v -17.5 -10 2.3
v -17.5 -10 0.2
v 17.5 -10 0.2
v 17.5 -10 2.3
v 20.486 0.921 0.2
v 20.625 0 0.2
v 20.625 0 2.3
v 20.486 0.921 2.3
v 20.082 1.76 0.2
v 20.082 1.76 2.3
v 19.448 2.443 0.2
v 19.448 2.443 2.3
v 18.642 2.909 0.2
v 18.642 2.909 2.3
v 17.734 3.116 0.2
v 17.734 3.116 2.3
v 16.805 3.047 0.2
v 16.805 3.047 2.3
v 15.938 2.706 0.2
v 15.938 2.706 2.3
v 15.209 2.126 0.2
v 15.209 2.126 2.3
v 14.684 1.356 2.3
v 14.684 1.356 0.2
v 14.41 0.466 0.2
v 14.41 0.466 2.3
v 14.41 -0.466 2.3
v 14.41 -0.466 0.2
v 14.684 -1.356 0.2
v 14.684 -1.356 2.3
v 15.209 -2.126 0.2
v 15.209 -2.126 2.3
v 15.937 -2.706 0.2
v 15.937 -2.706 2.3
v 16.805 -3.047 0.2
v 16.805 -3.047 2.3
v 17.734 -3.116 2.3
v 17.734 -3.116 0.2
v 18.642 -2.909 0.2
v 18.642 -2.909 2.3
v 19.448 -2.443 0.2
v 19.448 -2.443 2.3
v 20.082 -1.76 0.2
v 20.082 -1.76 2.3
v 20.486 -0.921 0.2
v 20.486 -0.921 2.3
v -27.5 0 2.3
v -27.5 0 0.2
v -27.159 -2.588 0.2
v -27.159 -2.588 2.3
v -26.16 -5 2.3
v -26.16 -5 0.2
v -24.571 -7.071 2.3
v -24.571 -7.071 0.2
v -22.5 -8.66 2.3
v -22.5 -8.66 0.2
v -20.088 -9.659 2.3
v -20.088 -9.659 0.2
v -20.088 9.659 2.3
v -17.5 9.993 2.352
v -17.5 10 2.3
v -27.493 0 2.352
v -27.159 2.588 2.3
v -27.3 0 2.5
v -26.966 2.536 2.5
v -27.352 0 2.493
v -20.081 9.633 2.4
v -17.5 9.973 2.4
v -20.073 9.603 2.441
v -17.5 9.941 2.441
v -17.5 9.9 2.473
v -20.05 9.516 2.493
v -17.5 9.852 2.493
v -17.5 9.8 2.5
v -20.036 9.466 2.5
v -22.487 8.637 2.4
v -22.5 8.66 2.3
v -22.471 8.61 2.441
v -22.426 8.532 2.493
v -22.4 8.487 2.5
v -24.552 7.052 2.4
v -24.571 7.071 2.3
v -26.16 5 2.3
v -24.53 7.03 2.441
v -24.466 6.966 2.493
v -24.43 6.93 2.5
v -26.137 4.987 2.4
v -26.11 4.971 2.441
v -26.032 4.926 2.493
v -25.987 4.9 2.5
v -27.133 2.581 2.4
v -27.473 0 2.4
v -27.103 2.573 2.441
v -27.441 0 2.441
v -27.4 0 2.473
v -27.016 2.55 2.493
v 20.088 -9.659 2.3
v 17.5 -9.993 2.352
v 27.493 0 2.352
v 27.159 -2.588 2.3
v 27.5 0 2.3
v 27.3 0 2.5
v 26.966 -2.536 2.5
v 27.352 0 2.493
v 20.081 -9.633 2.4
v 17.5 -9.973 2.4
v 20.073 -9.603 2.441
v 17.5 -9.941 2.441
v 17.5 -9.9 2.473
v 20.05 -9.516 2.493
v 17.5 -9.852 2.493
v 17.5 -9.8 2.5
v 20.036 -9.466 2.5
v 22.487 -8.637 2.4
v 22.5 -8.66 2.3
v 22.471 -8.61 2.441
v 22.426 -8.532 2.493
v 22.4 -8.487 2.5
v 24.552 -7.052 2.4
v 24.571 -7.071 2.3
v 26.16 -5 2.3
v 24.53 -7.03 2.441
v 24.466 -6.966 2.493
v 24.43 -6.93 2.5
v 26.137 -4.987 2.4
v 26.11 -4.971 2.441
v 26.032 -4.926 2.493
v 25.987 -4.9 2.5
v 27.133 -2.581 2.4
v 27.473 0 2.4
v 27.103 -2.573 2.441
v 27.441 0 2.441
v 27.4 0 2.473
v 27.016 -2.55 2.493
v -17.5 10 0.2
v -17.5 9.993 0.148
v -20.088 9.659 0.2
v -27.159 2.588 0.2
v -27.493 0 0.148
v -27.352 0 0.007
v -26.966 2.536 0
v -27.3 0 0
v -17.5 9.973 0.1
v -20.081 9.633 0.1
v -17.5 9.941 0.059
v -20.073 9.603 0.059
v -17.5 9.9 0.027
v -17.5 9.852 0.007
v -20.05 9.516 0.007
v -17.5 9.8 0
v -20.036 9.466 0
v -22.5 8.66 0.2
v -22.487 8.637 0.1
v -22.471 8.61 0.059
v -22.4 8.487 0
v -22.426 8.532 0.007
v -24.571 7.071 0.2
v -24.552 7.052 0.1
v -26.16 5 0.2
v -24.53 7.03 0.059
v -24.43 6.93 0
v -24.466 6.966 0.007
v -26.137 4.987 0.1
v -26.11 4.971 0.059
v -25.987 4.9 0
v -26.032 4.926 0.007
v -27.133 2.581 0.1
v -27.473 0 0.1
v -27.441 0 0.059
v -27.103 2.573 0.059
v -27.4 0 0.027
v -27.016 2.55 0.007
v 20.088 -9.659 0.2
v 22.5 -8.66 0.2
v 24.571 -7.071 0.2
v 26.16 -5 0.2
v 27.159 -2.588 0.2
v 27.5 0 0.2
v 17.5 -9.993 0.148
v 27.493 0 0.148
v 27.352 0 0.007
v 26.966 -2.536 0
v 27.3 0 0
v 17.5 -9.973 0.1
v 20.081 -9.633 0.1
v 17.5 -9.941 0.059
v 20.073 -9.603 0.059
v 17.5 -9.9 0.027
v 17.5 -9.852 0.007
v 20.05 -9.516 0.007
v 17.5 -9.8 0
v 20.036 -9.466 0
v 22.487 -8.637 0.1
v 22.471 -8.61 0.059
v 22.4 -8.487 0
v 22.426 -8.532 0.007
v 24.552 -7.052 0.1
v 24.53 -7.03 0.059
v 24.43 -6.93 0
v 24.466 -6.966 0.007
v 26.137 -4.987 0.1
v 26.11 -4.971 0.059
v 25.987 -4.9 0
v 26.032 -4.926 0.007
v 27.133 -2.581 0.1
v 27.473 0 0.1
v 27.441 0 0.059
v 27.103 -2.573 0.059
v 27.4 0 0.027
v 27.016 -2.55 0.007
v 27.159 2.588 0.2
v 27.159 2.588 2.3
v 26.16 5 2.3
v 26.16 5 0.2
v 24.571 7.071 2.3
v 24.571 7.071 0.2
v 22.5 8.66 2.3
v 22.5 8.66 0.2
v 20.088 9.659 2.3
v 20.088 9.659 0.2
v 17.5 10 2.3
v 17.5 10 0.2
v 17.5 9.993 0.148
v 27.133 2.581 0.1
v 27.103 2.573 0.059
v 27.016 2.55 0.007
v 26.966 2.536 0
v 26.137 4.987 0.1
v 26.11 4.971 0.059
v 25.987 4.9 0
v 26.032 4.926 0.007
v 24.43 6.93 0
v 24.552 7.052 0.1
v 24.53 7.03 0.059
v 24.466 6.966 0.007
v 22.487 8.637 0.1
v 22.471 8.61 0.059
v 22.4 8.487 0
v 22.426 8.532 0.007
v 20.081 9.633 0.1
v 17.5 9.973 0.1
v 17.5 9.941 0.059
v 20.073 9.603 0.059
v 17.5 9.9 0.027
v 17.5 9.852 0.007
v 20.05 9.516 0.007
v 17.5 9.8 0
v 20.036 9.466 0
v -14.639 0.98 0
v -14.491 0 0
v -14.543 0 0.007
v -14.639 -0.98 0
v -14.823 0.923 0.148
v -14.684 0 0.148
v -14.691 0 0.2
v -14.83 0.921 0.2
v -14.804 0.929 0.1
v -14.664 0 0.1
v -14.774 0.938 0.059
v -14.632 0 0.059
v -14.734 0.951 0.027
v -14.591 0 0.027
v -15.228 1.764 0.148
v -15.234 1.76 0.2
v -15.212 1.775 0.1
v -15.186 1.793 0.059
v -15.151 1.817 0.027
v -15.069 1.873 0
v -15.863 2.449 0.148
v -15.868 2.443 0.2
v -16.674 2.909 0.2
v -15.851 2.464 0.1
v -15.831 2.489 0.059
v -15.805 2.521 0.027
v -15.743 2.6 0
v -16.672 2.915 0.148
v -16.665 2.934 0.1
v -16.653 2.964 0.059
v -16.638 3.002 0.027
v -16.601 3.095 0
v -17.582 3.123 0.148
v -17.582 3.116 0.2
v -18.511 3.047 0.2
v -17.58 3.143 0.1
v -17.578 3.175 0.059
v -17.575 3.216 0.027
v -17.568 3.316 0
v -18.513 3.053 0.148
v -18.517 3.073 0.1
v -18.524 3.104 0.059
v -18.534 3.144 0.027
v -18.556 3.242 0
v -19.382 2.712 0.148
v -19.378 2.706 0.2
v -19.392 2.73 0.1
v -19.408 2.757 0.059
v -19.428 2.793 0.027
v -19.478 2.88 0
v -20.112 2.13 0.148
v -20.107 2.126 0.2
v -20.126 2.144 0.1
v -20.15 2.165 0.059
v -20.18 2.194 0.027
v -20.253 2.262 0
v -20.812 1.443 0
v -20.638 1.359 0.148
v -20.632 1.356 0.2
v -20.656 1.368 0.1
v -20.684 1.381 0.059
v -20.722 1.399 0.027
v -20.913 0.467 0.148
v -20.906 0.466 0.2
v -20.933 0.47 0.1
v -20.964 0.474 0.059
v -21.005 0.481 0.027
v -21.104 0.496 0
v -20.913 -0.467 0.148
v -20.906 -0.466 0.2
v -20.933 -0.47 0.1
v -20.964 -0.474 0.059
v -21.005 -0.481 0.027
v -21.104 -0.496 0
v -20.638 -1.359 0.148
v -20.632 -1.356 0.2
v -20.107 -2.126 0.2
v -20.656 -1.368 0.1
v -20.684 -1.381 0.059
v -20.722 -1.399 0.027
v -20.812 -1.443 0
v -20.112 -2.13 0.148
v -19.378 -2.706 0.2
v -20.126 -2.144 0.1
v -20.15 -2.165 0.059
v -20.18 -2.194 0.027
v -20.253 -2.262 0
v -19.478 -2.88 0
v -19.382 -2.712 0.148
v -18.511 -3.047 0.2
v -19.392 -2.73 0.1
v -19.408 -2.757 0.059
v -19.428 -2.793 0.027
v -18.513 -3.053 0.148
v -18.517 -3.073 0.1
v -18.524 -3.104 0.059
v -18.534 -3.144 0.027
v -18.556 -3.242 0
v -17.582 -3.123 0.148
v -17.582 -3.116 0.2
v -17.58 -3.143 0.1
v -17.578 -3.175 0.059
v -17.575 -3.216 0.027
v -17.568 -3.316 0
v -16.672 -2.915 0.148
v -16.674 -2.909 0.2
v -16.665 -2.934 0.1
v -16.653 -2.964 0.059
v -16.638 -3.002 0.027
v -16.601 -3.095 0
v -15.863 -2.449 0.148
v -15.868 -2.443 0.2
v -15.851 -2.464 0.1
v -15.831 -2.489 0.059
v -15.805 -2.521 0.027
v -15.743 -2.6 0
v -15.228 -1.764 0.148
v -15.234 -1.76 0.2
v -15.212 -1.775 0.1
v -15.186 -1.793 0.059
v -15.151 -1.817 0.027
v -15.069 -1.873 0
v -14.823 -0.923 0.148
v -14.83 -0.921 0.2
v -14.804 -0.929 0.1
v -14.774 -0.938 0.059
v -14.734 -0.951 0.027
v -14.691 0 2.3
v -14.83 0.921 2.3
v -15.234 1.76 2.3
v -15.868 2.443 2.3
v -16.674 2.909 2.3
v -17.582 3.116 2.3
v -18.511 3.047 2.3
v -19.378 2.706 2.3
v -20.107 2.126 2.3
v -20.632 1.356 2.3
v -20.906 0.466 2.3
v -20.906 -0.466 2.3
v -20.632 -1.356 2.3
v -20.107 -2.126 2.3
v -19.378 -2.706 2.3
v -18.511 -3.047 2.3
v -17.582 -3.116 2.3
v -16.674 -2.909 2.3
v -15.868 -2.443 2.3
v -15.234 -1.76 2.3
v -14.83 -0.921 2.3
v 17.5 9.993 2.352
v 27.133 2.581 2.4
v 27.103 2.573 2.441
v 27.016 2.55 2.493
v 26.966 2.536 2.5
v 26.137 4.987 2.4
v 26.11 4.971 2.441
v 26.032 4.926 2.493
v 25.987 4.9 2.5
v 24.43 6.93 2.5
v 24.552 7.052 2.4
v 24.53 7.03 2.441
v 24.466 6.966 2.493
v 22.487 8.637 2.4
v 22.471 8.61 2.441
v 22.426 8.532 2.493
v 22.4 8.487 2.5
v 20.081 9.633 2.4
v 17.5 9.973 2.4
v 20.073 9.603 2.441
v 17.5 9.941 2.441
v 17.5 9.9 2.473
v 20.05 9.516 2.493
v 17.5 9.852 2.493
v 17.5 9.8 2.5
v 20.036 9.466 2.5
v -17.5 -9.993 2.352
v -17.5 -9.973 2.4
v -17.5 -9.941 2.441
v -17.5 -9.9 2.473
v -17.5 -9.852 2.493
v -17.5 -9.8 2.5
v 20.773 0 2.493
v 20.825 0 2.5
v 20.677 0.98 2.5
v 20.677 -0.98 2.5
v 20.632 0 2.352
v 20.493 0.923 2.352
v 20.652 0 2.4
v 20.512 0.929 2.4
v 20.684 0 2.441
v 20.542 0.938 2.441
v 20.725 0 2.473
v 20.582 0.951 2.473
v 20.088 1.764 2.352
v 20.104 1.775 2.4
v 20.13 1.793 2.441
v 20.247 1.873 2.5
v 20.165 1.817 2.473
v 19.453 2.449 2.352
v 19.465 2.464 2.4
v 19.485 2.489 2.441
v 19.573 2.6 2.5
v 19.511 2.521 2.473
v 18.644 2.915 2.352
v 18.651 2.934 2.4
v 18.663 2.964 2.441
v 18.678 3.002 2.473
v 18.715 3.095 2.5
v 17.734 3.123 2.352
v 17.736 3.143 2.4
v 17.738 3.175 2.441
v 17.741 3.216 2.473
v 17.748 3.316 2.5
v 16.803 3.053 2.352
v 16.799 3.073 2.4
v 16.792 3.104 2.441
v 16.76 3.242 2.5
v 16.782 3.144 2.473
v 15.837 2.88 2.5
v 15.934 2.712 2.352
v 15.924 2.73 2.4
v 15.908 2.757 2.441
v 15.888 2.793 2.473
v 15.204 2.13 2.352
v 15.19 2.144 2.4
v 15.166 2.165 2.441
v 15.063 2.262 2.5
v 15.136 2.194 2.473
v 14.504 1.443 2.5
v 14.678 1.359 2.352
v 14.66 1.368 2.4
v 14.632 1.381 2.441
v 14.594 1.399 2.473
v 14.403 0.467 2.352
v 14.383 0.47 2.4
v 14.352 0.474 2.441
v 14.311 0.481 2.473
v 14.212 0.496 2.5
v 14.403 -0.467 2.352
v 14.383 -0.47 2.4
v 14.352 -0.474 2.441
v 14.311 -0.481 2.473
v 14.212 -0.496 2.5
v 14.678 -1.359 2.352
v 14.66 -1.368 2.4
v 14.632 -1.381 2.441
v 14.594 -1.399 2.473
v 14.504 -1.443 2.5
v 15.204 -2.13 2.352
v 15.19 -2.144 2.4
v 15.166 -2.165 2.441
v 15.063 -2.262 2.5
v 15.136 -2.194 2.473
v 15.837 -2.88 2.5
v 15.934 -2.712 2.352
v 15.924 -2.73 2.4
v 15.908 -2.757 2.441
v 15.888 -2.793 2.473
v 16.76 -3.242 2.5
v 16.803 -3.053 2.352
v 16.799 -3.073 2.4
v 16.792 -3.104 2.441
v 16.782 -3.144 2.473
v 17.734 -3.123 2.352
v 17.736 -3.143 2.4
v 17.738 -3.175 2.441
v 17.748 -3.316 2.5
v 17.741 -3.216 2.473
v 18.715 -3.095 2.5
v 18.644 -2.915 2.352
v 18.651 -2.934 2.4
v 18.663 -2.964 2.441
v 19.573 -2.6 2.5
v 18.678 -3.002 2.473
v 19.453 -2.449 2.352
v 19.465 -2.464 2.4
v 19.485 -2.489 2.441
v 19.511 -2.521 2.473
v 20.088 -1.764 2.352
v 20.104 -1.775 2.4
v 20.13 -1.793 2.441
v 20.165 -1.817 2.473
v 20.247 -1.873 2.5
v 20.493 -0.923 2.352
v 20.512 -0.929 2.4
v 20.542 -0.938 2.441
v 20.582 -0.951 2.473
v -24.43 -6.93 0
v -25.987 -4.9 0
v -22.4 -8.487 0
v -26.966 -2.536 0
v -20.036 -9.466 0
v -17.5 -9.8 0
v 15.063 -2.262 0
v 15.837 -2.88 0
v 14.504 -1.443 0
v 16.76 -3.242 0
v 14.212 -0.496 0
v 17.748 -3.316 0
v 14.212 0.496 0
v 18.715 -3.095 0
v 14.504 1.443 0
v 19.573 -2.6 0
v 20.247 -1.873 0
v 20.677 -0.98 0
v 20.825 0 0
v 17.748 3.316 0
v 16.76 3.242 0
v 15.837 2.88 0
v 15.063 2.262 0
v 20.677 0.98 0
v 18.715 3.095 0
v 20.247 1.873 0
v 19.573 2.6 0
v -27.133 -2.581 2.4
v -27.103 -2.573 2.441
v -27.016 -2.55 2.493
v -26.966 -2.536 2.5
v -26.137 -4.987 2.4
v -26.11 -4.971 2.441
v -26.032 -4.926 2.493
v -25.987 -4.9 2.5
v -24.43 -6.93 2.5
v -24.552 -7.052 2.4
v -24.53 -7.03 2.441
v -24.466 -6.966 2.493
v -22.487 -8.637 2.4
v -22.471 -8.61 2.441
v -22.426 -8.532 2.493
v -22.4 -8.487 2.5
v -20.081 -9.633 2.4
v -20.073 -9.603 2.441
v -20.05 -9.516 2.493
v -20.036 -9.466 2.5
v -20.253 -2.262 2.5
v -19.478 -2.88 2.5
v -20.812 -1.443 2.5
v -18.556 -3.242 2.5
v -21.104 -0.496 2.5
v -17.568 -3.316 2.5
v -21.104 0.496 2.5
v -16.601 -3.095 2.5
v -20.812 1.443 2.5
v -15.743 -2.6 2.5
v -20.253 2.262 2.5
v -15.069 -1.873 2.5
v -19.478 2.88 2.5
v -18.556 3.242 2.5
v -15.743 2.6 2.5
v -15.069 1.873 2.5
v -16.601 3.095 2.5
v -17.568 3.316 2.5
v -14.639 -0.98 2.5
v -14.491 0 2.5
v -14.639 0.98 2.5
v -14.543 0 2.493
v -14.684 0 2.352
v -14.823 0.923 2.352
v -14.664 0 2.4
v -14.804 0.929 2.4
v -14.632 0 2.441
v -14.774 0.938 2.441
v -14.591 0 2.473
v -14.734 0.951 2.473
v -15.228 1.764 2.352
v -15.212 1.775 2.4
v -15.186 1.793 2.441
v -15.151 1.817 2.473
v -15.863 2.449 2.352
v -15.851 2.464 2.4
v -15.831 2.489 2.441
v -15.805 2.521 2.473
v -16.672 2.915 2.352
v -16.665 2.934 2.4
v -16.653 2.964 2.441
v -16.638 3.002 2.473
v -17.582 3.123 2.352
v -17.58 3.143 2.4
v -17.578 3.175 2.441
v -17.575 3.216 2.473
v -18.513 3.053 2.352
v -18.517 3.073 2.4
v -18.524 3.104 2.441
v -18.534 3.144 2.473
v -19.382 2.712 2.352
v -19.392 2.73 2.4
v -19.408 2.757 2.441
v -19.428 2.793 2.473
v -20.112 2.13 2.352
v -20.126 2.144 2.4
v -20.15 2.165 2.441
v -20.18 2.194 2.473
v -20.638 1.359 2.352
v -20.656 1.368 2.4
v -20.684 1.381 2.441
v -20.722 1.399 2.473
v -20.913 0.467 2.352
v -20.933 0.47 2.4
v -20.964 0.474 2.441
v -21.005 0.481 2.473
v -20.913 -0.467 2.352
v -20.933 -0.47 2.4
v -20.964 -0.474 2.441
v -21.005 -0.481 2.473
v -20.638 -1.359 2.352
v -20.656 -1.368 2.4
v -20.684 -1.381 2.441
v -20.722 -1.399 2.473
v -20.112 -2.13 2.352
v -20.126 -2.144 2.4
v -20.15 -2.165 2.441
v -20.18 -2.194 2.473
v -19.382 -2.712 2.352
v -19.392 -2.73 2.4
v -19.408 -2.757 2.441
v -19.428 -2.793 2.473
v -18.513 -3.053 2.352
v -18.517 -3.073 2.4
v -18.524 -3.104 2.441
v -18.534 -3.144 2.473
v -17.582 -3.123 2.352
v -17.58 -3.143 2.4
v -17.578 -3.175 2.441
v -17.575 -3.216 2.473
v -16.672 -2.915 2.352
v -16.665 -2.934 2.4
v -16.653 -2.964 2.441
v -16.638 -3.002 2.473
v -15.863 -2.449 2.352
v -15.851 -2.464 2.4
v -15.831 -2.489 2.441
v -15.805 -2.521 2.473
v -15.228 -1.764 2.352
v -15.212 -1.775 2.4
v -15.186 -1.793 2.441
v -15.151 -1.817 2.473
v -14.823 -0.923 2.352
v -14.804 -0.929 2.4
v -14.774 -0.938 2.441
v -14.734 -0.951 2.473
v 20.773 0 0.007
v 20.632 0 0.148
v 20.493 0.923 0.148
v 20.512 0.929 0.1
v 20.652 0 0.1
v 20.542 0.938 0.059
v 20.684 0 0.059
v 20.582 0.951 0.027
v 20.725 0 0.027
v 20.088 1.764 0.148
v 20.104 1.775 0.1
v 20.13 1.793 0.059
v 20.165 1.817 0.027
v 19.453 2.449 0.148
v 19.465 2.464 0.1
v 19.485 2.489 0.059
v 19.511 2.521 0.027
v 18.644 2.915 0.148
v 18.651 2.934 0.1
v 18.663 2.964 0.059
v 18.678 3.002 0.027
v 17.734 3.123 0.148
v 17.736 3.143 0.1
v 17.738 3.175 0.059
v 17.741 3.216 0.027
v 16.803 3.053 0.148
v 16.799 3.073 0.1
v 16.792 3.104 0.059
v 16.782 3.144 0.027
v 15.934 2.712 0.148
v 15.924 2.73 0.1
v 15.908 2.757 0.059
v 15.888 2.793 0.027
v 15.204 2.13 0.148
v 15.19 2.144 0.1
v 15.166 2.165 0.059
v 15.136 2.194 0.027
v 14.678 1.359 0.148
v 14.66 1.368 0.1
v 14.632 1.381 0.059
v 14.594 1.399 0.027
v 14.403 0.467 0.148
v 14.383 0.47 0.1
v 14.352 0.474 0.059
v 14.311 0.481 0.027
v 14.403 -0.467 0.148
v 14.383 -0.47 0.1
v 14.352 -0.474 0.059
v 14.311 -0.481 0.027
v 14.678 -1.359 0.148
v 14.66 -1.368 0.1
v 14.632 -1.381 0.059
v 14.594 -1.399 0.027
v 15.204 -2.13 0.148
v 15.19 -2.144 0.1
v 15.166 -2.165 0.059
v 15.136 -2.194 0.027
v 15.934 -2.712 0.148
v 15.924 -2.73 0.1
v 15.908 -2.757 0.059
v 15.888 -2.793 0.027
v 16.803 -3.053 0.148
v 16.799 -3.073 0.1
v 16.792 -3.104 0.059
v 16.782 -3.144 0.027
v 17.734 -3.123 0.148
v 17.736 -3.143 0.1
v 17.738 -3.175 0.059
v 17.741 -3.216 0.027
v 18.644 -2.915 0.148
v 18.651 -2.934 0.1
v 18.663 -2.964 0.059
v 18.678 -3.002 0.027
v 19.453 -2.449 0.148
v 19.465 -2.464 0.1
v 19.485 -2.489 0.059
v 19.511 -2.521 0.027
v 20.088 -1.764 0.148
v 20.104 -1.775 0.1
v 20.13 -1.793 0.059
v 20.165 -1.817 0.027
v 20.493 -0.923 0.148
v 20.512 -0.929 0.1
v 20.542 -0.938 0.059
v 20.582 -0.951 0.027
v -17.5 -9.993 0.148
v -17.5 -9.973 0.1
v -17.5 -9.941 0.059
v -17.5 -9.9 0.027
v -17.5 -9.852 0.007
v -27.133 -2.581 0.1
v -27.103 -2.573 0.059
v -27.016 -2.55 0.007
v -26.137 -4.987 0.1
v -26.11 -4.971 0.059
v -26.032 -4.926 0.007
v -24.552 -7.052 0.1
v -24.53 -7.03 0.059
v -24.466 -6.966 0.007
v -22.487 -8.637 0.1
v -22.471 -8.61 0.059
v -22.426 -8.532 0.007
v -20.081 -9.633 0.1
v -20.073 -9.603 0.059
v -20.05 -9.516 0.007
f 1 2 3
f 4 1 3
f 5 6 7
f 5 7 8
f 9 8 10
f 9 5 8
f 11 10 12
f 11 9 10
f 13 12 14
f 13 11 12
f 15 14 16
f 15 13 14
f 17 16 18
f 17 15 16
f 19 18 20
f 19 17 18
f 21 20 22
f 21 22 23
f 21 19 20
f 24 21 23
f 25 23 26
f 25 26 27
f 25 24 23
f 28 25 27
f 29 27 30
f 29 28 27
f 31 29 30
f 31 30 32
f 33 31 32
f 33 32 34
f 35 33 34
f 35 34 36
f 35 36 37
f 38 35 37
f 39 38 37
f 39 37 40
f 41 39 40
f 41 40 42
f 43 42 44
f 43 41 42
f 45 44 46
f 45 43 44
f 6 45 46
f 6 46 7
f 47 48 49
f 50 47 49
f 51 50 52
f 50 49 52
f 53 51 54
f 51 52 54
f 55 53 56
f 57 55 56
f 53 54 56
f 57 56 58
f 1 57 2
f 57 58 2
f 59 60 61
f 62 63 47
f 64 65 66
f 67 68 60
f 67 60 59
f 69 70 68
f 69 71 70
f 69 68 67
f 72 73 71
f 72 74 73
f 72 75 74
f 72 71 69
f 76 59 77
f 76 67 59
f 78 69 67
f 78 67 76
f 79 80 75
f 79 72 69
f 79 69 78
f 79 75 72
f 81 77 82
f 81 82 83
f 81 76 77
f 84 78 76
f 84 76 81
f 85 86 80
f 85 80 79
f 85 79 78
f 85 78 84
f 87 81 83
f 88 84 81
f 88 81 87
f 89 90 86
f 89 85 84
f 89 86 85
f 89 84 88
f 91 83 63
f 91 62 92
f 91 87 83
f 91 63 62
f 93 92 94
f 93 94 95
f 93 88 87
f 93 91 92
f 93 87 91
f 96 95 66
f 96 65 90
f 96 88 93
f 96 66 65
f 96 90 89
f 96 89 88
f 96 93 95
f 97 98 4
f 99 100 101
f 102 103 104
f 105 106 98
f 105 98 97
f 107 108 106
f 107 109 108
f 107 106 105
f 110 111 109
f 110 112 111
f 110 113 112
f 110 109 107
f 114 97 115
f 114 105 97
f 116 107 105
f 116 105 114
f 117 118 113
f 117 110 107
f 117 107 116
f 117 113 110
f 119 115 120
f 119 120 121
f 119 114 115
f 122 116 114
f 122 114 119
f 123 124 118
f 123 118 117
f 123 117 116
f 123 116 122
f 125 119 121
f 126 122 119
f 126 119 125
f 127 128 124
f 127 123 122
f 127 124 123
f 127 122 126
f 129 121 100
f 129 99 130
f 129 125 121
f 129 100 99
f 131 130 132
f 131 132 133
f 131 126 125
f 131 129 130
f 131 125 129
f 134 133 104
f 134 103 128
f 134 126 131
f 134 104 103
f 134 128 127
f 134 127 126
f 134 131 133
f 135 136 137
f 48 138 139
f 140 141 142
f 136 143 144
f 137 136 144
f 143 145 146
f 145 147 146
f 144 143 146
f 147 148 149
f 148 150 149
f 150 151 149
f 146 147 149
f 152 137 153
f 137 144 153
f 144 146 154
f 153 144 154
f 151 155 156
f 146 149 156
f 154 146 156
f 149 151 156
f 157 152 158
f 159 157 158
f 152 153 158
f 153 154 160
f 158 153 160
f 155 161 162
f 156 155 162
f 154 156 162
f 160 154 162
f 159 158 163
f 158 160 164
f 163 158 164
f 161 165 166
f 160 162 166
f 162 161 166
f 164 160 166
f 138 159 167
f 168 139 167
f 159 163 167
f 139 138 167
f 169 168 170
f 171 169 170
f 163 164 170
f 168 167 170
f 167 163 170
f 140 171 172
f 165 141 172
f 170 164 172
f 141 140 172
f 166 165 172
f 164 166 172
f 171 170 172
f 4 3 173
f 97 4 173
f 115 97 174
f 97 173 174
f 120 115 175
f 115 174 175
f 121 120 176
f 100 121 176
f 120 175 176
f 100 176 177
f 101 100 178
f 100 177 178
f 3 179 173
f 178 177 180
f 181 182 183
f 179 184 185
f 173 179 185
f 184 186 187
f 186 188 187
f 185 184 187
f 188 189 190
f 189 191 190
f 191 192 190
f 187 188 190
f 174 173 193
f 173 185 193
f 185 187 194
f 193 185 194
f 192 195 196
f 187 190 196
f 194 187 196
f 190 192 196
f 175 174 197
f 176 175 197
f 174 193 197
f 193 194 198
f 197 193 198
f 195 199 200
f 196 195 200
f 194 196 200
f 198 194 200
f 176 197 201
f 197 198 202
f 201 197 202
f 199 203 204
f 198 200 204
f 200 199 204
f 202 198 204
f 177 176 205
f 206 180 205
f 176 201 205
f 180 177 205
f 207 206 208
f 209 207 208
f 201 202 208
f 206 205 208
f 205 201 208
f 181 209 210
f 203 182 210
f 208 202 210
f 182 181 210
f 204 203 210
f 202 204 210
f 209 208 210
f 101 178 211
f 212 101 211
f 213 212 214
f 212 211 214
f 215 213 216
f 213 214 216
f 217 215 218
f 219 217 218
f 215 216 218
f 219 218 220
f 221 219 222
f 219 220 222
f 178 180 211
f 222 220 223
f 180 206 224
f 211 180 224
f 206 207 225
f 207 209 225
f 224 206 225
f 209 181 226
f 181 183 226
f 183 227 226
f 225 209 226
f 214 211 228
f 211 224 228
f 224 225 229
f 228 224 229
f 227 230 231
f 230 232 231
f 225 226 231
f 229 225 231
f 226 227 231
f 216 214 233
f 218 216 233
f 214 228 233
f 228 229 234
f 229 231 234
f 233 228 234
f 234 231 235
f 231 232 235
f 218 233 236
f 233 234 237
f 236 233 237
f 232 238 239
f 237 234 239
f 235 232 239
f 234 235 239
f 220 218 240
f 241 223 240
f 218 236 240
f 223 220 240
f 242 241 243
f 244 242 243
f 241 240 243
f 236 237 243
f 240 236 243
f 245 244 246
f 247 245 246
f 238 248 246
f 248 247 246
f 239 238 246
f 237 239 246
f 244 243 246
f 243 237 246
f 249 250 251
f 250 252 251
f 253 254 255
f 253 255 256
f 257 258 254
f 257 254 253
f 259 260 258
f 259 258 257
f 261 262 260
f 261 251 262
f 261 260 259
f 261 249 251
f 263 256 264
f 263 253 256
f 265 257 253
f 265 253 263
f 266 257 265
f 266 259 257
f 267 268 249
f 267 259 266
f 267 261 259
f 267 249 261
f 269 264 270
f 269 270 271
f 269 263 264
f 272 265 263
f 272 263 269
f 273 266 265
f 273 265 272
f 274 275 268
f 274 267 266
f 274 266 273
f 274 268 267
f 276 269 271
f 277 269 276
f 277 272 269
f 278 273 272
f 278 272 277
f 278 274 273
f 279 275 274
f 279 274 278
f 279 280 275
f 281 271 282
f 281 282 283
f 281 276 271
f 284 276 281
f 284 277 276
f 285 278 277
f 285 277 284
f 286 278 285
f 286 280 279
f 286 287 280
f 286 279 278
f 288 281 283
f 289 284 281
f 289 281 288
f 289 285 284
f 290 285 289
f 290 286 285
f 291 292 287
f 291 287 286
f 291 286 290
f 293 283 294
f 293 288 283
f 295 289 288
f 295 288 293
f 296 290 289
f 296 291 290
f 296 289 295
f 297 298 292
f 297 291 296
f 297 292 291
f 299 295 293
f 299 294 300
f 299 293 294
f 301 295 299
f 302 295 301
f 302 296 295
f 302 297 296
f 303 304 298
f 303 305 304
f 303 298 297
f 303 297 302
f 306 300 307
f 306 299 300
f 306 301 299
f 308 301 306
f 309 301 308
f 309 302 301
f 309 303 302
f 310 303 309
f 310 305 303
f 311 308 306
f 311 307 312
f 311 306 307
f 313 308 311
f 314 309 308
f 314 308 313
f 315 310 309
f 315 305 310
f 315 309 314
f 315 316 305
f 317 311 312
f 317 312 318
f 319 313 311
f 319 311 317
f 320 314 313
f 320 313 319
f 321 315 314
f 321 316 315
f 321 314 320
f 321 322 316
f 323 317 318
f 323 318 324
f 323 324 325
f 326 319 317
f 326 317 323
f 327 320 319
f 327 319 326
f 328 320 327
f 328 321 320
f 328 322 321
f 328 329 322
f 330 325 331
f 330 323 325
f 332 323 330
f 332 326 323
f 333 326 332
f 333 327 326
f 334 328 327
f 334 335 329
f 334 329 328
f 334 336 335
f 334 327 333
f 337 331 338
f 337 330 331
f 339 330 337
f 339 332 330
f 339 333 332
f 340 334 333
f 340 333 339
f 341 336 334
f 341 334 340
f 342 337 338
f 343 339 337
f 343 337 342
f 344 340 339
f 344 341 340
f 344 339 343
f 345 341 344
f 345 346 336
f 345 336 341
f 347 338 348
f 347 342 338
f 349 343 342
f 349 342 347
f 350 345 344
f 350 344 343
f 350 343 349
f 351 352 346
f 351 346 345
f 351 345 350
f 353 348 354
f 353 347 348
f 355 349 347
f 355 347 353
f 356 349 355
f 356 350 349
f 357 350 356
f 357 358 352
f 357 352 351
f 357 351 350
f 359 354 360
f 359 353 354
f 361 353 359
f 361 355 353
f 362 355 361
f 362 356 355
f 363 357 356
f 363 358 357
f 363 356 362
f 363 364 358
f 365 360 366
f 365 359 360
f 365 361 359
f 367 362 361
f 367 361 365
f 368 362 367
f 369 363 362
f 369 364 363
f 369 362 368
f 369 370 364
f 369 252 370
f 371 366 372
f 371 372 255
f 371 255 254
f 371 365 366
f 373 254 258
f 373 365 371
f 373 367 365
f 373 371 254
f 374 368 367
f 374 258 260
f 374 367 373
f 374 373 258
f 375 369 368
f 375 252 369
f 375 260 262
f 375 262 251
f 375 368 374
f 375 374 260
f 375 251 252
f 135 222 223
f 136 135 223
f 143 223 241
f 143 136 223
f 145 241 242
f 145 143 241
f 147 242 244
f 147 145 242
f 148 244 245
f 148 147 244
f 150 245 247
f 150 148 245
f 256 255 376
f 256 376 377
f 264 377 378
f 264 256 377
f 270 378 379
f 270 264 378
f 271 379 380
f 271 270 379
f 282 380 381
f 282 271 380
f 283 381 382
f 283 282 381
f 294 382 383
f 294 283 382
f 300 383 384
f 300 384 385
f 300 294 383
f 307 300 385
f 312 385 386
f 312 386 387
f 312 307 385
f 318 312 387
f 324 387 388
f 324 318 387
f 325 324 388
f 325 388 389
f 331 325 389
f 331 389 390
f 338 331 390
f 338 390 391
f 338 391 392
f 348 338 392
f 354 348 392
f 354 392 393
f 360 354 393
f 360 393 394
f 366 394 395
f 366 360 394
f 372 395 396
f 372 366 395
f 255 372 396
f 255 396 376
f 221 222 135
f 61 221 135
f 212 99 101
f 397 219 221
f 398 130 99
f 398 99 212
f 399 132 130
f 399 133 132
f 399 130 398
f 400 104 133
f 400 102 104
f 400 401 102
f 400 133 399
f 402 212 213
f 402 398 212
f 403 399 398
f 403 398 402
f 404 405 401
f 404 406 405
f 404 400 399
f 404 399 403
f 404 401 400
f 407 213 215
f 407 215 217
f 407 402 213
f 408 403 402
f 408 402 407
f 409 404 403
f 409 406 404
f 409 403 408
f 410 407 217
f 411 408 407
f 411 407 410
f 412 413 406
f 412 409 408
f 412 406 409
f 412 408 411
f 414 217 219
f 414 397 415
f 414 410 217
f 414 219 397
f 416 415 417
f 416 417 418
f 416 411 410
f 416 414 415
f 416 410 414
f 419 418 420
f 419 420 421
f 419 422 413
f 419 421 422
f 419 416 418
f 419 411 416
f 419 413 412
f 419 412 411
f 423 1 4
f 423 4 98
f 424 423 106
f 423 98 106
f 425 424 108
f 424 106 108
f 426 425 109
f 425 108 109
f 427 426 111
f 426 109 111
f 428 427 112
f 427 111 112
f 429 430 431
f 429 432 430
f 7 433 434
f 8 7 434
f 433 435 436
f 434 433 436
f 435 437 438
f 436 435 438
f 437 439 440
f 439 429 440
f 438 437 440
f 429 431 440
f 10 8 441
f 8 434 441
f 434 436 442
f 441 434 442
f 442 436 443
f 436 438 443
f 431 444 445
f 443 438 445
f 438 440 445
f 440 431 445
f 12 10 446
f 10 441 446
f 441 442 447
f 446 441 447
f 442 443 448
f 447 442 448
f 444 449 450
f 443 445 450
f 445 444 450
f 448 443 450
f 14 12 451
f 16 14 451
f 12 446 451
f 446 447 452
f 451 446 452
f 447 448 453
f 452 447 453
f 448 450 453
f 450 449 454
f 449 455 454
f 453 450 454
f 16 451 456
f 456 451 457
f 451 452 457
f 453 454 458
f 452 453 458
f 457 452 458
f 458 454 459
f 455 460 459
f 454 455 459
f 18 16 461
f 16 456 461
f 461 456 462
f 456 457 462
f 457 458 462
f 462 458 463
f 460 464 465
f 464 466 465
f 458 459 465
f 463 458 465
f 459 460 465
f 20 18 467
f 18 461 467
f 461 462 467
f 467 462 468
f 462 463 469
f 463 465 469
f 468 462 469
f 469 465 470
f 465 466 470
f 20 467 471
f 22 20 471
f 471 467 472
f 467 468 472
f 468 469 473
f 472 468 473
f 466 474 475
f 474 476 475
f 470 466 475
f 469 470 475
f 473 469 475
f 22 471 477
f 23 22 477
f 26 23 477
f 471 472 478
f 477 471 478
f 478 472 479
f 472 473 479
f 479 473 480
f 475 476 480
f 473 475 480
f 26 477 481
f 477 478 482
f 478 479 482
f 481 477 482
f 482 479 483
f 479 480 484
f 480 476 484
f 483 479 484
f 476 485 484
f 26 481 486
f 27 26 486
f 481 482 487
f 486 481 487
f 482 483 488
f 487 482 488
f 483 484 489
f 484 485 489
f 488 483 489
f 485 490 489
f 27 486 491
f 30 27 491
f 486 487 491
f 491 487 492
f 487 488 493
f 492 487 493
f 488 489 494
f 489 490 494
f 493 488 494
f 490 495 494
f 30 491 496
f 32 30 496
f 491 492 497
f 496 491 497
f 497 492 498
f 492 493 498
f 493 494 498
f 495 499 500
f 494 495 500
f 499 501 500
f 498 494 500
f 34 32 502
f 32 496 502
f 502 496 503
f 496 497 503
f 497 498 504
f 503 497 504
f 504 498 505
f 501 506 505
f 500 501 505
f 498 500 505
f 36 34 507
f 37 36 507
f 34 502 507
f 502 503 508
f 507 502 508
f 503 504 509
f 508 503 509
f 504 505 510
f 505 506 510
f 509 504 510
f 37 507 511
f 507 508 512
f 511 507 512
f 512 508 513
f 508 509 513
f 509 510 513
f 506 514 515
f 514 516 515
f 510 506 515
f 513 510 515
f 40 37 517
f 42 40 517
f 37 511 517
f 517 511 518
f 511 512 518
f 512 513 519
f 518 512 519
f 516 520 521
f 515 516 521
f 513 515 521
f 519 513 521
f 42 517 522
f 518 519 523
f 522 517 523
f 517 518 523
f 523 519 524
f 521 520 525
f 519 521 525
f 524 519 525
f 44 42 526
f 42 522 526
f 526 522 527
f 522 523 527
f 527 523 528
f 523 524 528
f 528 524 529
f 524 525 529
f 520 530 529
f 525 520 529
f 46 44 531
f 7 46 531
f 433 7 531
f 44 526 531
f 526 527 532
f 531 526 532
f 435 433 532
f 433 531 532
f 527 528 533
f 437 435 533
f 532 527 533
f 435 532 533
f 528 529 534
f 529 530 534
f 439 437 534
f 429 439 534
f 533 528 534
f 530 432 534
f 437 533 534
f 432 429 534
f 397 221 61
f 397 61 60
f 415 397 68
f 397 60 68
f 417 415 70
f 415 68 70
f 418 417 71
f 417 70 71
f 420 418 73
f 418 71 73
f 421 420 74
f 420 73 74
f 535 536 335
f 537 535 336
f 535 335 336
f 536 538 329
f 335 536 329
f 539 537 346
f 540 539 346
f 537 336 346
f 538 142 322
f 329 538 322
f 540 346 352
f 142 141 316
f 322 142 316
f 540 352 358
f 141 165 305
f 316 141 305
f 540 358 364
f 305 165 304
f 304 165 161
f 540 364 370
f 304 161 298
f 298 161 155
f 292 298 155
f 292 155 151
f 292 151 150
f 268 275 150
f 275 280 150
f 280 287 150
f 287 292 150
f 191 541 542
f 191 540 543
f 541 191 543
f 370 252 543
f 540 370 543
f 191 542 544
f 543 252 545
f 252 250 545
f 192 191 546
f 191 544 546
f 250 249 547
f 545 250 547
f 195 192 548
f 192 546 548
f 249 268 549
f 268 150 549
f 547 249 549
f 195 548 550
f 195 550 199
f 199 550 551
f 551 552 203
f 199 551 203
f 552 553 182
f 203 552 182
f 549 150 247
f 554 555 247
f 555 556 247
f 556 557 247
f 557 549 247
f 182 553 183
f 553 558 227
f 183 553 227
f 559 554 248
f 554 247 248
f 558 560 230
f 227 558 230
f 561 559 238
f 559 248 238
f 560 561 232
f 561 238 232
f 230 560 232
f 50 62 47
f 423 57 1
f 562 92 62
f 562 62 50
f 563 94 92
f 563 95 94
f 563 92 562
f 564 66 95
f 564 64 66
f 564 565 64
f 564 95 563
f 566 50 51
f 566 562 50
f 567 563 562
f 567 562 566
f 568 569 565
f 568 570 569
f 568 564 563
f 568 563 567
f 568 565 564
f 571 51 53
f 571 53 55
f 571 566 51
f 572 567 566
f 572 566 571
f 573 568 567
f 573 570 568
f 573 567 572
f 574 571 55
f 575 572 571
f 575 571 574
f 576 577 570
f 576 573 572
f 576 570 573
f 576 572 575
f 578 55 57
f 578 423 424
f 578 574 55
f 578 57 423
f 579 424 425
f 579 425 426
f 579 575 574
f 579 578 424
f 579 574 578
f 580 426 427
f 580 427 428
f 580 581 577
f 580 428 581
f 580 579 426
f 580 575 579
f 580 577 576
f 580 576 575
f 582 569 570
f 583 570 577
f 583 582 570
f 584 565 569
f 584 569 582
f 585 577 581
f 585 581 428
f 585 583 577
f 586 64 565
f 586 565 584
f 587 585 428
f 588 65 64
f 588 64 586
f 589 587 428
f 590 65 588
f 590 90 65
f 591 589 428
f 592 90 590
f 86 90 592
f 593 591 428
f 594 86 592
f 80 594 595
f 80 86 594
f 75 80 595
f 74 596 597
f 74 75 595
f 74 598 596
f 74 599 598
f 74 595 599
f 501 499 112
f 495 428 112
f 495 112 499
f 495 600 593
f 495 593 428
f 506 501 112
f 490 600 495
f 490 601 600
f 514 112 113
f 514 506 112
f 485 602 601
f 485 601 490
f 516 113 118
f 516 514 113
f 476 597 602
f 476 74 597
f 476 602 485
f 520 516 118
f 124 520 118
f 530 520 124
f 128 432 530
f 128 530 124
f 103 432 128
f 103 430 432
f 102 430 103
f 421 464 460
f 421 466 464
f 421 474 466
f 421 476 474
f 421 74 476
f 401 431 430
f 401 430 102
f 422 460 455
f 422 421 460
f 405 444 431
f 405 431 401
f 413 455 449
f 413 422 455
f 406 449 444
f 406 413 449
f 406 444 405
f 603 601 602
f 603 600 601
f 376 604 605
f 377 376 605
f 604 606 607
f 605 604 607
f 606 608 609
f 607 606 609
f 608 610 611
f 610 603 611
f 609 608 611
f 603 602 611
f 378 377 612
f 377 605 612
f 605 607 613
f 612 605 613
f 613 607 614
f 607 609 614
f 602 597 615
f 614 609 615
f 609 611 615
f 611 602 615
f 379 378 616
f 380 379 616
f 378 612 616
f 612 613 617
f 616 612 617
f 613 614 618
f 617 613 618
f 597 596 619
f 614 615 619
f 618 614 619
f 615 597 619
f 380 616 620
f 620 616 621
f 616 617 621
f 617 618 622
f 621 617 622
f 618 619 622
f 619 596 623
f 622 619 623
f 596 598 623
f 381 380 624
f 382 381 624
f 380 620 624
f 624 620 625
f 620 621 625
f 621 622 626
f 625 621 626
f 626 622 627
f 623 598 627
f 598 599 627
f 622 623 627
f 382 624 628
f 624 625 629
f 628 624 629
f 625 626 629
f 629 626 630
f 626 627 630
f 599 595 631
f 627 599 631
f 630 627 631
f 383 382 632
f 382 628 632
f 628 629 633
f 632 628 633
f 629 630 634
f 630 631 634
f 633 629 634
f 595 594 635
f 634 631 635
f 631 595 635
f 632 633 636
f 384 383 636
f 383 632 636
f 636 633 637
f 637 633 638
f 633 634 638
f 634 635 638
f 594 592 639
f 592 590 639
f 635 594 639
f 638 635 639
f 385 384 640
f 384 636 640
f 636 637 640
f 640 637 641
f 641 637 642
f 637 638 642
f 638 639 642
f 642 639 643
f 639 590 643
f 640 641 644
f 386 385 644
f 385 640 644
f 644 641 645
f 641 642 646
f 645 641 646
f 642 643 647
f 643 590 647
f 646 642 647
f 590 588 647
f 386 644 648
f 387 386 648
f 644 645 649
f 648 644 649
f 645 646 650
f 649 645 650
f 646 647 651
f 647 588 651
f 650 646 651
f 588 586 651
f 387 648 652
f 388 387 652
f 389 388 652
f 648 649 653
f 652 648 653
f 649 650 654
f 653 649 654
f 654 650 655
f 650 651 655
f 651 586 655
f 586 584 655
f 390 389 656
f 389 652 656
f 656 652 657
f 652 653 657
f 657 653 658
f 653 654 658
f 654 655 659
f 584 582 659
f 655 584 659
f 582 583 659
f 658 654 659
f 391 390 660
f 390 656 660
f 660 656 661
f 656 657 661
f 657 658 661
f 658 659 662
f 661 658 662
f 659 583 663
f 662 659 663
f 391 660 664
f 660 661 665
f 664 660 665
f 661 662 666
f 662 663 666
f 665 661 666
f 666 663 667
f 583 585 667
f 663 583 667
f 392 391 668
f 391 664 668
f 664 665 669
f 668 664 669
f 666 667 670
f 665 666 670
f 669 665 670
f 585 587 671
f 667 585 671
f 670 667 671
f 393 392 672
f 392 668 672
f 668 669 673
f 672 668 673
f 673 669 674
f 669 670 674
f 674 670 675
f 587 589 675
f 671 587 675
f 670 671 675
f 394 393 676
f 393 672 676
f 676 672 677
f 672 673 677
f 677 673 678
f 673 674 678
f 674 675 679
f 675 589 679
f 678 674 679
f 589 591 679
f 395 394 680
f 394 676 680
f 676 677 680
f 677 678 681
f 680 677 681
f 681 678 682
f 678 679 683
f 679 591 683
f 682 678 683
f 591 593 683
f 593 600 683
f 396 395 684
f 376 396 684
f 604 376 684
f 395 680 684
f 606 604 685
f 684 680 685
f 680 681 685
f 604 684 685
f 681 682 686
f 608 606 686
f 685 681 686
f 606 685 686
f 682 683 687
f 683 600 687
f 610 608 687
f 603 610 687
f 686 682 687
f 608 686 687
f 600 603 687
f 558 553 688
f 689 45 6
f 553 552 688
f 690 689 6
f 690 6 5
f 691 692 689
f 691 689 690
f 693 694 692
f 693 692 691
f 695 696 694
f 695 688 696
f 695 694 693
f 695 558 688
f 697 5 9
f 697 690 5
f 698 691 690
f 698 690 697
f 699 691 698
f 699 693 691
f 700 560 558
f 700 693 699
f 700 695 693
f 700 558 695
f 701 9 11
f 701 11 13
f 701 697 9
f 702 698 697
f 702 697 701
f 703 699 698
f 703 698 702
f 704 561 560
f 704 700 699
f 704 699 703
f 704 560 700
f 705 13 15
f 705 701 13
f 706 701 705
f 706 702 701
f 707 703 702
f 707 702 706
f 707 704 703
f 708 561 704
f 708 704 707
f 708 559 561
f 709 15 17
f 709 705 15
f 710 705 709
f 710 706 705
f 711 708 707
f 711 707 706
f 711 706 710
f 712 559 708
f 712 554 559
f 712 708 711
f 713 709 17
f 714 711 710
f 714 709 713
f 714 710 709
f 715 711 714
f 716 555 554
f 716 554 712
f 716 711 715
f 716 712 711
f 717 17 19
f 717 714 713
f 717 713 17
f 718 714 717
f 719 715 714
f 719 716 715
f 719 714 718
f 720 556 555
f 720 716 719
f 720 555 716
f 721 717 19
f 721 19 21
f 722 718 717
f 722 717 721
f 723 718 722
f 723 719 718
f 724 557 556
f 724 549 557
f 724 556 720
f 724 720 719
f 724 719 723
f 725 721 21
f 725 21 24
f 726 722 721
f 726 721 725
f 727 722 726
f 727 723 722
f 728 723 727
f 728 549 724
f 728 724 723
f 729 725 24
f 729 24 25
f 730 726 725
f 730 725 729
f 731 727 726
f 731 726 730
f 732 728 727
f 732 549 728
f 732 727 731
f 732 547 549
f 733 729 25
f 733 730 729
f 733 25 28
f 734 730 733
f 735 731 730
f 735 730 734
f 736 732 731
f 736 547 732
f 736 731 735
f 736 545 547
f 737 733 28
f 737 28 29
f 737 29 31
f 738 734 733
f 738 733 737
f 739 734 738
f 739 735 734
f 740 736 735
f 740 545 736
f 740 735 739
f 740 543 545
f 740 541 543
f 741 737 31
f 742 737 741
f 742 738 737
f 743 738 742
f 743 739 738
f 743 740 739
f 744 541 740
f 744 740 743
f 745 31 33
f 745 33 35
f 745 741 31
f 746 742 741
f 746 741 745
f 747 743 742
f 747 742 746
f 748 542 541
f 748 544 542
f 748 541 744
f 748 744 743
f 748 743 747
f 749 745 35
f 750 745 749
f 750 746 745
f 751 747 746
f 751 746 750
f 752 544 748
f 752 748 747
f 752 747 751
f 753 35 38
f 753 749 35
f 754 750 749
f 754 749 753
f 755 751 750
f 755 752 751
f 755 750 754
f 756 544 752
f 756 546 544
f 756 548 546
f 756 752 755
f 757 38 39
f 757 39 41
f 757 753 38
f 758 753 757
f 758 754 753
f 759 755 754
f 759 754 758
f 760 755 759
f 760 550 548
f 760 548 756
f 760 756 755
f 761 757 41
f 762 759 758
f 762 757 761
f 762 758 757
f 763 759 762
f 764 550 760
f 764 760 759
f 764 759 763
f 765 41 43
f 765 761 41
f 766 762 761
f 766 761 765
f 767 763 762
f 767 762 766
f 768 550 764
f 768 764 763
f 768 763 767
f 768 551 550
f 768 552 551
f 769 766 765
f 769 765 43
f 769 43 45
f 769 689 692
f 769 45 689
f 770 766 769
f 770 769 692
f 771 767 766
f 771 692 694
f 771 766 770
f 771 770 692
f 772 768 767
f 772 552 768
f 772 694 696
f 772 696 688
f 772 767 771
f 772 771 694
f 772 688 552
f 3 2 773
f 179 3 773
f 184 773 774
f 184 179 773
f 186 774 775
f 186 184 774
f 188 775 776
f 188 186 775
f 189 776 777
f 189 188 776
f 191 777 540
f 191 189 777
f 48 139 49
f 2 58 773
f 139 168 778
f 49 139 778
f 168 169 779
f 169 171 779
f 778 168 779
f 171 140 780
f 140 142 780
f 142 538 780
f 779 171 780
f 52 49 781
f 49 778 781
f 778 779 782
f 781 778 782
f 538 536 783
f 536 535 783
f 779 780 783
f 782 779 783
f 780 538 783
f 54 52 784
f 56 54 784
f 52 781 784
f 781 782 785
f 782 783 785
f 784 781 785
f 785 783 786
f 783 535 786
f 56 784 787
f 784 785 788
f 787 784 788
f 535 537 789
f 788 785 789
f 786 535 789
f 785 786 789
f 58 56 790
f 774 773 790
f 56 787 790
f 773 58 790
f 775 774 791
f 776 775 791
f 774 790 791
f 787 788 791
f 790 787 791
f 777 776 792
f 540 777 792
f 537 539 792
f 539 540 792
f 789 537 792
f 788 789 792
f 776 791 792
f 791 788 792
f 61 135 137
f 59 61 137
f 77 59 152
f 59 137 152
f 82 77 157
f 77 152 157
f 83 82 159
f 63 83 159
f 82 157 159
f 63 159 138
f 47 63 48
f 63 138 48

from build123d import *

# Parameters (mm, degrees)
F0_R     = 3.125
F1_DEPTH = 2.5
F2_R     = 0.2


with BuildPart() as f1:
    # F0 (on Top) → F1 (new body)
    with BuildSketch(Plane.XY):
        with BuildLine():
            Line((-17.5, -10), (17.5, -10))
            ThreePointArc((17.5, -10), (24.571068, -7.071068), (27.5, 0))
            ThreePointArc((27.5, 0), (24.571068, 7.071068), (17.5, 10))
            Line((17.5, 10), (-17.5, 10))
            ThreePointArc((-17.5, 10), (-24.571068, 7.071068), (-27.5, 0))
            ThreePointArc((-27.5, 0), (-24.571068, -7.071068), (-17.5, -10))
        make_face()
        with Locations((-17.815998, 0)):
            Circle(F0_R, mode=Mode.SUBTRACT)
        with Locations((17.5, 0)):
            Circle(F0_R, mode=Mode.SUBTRACT)
    extrude(amount=F1_DEPTH)

    # F2
    f2_edges = [f1.edges().sort_by_distance(p)[0] for p in [
        (-27.5, 0, 2.5),
        (0, 10, 2.5),
        (27.5, 0, 2.5),
        (0, -10, 2.5),
        (-20.940998, 0, 2.5),
        (14.375, 0, 2.5),
        (-20.940998, 0, 0),
        (14.375, 0, 0),
        (27.5, 0, 0),
        (0, -10, 0),
        (-27.5, 0, 0),
        (0, 10, 0),
    ]]
    fillet(f2_edges, radius=F2_R)


solid = f1.part
